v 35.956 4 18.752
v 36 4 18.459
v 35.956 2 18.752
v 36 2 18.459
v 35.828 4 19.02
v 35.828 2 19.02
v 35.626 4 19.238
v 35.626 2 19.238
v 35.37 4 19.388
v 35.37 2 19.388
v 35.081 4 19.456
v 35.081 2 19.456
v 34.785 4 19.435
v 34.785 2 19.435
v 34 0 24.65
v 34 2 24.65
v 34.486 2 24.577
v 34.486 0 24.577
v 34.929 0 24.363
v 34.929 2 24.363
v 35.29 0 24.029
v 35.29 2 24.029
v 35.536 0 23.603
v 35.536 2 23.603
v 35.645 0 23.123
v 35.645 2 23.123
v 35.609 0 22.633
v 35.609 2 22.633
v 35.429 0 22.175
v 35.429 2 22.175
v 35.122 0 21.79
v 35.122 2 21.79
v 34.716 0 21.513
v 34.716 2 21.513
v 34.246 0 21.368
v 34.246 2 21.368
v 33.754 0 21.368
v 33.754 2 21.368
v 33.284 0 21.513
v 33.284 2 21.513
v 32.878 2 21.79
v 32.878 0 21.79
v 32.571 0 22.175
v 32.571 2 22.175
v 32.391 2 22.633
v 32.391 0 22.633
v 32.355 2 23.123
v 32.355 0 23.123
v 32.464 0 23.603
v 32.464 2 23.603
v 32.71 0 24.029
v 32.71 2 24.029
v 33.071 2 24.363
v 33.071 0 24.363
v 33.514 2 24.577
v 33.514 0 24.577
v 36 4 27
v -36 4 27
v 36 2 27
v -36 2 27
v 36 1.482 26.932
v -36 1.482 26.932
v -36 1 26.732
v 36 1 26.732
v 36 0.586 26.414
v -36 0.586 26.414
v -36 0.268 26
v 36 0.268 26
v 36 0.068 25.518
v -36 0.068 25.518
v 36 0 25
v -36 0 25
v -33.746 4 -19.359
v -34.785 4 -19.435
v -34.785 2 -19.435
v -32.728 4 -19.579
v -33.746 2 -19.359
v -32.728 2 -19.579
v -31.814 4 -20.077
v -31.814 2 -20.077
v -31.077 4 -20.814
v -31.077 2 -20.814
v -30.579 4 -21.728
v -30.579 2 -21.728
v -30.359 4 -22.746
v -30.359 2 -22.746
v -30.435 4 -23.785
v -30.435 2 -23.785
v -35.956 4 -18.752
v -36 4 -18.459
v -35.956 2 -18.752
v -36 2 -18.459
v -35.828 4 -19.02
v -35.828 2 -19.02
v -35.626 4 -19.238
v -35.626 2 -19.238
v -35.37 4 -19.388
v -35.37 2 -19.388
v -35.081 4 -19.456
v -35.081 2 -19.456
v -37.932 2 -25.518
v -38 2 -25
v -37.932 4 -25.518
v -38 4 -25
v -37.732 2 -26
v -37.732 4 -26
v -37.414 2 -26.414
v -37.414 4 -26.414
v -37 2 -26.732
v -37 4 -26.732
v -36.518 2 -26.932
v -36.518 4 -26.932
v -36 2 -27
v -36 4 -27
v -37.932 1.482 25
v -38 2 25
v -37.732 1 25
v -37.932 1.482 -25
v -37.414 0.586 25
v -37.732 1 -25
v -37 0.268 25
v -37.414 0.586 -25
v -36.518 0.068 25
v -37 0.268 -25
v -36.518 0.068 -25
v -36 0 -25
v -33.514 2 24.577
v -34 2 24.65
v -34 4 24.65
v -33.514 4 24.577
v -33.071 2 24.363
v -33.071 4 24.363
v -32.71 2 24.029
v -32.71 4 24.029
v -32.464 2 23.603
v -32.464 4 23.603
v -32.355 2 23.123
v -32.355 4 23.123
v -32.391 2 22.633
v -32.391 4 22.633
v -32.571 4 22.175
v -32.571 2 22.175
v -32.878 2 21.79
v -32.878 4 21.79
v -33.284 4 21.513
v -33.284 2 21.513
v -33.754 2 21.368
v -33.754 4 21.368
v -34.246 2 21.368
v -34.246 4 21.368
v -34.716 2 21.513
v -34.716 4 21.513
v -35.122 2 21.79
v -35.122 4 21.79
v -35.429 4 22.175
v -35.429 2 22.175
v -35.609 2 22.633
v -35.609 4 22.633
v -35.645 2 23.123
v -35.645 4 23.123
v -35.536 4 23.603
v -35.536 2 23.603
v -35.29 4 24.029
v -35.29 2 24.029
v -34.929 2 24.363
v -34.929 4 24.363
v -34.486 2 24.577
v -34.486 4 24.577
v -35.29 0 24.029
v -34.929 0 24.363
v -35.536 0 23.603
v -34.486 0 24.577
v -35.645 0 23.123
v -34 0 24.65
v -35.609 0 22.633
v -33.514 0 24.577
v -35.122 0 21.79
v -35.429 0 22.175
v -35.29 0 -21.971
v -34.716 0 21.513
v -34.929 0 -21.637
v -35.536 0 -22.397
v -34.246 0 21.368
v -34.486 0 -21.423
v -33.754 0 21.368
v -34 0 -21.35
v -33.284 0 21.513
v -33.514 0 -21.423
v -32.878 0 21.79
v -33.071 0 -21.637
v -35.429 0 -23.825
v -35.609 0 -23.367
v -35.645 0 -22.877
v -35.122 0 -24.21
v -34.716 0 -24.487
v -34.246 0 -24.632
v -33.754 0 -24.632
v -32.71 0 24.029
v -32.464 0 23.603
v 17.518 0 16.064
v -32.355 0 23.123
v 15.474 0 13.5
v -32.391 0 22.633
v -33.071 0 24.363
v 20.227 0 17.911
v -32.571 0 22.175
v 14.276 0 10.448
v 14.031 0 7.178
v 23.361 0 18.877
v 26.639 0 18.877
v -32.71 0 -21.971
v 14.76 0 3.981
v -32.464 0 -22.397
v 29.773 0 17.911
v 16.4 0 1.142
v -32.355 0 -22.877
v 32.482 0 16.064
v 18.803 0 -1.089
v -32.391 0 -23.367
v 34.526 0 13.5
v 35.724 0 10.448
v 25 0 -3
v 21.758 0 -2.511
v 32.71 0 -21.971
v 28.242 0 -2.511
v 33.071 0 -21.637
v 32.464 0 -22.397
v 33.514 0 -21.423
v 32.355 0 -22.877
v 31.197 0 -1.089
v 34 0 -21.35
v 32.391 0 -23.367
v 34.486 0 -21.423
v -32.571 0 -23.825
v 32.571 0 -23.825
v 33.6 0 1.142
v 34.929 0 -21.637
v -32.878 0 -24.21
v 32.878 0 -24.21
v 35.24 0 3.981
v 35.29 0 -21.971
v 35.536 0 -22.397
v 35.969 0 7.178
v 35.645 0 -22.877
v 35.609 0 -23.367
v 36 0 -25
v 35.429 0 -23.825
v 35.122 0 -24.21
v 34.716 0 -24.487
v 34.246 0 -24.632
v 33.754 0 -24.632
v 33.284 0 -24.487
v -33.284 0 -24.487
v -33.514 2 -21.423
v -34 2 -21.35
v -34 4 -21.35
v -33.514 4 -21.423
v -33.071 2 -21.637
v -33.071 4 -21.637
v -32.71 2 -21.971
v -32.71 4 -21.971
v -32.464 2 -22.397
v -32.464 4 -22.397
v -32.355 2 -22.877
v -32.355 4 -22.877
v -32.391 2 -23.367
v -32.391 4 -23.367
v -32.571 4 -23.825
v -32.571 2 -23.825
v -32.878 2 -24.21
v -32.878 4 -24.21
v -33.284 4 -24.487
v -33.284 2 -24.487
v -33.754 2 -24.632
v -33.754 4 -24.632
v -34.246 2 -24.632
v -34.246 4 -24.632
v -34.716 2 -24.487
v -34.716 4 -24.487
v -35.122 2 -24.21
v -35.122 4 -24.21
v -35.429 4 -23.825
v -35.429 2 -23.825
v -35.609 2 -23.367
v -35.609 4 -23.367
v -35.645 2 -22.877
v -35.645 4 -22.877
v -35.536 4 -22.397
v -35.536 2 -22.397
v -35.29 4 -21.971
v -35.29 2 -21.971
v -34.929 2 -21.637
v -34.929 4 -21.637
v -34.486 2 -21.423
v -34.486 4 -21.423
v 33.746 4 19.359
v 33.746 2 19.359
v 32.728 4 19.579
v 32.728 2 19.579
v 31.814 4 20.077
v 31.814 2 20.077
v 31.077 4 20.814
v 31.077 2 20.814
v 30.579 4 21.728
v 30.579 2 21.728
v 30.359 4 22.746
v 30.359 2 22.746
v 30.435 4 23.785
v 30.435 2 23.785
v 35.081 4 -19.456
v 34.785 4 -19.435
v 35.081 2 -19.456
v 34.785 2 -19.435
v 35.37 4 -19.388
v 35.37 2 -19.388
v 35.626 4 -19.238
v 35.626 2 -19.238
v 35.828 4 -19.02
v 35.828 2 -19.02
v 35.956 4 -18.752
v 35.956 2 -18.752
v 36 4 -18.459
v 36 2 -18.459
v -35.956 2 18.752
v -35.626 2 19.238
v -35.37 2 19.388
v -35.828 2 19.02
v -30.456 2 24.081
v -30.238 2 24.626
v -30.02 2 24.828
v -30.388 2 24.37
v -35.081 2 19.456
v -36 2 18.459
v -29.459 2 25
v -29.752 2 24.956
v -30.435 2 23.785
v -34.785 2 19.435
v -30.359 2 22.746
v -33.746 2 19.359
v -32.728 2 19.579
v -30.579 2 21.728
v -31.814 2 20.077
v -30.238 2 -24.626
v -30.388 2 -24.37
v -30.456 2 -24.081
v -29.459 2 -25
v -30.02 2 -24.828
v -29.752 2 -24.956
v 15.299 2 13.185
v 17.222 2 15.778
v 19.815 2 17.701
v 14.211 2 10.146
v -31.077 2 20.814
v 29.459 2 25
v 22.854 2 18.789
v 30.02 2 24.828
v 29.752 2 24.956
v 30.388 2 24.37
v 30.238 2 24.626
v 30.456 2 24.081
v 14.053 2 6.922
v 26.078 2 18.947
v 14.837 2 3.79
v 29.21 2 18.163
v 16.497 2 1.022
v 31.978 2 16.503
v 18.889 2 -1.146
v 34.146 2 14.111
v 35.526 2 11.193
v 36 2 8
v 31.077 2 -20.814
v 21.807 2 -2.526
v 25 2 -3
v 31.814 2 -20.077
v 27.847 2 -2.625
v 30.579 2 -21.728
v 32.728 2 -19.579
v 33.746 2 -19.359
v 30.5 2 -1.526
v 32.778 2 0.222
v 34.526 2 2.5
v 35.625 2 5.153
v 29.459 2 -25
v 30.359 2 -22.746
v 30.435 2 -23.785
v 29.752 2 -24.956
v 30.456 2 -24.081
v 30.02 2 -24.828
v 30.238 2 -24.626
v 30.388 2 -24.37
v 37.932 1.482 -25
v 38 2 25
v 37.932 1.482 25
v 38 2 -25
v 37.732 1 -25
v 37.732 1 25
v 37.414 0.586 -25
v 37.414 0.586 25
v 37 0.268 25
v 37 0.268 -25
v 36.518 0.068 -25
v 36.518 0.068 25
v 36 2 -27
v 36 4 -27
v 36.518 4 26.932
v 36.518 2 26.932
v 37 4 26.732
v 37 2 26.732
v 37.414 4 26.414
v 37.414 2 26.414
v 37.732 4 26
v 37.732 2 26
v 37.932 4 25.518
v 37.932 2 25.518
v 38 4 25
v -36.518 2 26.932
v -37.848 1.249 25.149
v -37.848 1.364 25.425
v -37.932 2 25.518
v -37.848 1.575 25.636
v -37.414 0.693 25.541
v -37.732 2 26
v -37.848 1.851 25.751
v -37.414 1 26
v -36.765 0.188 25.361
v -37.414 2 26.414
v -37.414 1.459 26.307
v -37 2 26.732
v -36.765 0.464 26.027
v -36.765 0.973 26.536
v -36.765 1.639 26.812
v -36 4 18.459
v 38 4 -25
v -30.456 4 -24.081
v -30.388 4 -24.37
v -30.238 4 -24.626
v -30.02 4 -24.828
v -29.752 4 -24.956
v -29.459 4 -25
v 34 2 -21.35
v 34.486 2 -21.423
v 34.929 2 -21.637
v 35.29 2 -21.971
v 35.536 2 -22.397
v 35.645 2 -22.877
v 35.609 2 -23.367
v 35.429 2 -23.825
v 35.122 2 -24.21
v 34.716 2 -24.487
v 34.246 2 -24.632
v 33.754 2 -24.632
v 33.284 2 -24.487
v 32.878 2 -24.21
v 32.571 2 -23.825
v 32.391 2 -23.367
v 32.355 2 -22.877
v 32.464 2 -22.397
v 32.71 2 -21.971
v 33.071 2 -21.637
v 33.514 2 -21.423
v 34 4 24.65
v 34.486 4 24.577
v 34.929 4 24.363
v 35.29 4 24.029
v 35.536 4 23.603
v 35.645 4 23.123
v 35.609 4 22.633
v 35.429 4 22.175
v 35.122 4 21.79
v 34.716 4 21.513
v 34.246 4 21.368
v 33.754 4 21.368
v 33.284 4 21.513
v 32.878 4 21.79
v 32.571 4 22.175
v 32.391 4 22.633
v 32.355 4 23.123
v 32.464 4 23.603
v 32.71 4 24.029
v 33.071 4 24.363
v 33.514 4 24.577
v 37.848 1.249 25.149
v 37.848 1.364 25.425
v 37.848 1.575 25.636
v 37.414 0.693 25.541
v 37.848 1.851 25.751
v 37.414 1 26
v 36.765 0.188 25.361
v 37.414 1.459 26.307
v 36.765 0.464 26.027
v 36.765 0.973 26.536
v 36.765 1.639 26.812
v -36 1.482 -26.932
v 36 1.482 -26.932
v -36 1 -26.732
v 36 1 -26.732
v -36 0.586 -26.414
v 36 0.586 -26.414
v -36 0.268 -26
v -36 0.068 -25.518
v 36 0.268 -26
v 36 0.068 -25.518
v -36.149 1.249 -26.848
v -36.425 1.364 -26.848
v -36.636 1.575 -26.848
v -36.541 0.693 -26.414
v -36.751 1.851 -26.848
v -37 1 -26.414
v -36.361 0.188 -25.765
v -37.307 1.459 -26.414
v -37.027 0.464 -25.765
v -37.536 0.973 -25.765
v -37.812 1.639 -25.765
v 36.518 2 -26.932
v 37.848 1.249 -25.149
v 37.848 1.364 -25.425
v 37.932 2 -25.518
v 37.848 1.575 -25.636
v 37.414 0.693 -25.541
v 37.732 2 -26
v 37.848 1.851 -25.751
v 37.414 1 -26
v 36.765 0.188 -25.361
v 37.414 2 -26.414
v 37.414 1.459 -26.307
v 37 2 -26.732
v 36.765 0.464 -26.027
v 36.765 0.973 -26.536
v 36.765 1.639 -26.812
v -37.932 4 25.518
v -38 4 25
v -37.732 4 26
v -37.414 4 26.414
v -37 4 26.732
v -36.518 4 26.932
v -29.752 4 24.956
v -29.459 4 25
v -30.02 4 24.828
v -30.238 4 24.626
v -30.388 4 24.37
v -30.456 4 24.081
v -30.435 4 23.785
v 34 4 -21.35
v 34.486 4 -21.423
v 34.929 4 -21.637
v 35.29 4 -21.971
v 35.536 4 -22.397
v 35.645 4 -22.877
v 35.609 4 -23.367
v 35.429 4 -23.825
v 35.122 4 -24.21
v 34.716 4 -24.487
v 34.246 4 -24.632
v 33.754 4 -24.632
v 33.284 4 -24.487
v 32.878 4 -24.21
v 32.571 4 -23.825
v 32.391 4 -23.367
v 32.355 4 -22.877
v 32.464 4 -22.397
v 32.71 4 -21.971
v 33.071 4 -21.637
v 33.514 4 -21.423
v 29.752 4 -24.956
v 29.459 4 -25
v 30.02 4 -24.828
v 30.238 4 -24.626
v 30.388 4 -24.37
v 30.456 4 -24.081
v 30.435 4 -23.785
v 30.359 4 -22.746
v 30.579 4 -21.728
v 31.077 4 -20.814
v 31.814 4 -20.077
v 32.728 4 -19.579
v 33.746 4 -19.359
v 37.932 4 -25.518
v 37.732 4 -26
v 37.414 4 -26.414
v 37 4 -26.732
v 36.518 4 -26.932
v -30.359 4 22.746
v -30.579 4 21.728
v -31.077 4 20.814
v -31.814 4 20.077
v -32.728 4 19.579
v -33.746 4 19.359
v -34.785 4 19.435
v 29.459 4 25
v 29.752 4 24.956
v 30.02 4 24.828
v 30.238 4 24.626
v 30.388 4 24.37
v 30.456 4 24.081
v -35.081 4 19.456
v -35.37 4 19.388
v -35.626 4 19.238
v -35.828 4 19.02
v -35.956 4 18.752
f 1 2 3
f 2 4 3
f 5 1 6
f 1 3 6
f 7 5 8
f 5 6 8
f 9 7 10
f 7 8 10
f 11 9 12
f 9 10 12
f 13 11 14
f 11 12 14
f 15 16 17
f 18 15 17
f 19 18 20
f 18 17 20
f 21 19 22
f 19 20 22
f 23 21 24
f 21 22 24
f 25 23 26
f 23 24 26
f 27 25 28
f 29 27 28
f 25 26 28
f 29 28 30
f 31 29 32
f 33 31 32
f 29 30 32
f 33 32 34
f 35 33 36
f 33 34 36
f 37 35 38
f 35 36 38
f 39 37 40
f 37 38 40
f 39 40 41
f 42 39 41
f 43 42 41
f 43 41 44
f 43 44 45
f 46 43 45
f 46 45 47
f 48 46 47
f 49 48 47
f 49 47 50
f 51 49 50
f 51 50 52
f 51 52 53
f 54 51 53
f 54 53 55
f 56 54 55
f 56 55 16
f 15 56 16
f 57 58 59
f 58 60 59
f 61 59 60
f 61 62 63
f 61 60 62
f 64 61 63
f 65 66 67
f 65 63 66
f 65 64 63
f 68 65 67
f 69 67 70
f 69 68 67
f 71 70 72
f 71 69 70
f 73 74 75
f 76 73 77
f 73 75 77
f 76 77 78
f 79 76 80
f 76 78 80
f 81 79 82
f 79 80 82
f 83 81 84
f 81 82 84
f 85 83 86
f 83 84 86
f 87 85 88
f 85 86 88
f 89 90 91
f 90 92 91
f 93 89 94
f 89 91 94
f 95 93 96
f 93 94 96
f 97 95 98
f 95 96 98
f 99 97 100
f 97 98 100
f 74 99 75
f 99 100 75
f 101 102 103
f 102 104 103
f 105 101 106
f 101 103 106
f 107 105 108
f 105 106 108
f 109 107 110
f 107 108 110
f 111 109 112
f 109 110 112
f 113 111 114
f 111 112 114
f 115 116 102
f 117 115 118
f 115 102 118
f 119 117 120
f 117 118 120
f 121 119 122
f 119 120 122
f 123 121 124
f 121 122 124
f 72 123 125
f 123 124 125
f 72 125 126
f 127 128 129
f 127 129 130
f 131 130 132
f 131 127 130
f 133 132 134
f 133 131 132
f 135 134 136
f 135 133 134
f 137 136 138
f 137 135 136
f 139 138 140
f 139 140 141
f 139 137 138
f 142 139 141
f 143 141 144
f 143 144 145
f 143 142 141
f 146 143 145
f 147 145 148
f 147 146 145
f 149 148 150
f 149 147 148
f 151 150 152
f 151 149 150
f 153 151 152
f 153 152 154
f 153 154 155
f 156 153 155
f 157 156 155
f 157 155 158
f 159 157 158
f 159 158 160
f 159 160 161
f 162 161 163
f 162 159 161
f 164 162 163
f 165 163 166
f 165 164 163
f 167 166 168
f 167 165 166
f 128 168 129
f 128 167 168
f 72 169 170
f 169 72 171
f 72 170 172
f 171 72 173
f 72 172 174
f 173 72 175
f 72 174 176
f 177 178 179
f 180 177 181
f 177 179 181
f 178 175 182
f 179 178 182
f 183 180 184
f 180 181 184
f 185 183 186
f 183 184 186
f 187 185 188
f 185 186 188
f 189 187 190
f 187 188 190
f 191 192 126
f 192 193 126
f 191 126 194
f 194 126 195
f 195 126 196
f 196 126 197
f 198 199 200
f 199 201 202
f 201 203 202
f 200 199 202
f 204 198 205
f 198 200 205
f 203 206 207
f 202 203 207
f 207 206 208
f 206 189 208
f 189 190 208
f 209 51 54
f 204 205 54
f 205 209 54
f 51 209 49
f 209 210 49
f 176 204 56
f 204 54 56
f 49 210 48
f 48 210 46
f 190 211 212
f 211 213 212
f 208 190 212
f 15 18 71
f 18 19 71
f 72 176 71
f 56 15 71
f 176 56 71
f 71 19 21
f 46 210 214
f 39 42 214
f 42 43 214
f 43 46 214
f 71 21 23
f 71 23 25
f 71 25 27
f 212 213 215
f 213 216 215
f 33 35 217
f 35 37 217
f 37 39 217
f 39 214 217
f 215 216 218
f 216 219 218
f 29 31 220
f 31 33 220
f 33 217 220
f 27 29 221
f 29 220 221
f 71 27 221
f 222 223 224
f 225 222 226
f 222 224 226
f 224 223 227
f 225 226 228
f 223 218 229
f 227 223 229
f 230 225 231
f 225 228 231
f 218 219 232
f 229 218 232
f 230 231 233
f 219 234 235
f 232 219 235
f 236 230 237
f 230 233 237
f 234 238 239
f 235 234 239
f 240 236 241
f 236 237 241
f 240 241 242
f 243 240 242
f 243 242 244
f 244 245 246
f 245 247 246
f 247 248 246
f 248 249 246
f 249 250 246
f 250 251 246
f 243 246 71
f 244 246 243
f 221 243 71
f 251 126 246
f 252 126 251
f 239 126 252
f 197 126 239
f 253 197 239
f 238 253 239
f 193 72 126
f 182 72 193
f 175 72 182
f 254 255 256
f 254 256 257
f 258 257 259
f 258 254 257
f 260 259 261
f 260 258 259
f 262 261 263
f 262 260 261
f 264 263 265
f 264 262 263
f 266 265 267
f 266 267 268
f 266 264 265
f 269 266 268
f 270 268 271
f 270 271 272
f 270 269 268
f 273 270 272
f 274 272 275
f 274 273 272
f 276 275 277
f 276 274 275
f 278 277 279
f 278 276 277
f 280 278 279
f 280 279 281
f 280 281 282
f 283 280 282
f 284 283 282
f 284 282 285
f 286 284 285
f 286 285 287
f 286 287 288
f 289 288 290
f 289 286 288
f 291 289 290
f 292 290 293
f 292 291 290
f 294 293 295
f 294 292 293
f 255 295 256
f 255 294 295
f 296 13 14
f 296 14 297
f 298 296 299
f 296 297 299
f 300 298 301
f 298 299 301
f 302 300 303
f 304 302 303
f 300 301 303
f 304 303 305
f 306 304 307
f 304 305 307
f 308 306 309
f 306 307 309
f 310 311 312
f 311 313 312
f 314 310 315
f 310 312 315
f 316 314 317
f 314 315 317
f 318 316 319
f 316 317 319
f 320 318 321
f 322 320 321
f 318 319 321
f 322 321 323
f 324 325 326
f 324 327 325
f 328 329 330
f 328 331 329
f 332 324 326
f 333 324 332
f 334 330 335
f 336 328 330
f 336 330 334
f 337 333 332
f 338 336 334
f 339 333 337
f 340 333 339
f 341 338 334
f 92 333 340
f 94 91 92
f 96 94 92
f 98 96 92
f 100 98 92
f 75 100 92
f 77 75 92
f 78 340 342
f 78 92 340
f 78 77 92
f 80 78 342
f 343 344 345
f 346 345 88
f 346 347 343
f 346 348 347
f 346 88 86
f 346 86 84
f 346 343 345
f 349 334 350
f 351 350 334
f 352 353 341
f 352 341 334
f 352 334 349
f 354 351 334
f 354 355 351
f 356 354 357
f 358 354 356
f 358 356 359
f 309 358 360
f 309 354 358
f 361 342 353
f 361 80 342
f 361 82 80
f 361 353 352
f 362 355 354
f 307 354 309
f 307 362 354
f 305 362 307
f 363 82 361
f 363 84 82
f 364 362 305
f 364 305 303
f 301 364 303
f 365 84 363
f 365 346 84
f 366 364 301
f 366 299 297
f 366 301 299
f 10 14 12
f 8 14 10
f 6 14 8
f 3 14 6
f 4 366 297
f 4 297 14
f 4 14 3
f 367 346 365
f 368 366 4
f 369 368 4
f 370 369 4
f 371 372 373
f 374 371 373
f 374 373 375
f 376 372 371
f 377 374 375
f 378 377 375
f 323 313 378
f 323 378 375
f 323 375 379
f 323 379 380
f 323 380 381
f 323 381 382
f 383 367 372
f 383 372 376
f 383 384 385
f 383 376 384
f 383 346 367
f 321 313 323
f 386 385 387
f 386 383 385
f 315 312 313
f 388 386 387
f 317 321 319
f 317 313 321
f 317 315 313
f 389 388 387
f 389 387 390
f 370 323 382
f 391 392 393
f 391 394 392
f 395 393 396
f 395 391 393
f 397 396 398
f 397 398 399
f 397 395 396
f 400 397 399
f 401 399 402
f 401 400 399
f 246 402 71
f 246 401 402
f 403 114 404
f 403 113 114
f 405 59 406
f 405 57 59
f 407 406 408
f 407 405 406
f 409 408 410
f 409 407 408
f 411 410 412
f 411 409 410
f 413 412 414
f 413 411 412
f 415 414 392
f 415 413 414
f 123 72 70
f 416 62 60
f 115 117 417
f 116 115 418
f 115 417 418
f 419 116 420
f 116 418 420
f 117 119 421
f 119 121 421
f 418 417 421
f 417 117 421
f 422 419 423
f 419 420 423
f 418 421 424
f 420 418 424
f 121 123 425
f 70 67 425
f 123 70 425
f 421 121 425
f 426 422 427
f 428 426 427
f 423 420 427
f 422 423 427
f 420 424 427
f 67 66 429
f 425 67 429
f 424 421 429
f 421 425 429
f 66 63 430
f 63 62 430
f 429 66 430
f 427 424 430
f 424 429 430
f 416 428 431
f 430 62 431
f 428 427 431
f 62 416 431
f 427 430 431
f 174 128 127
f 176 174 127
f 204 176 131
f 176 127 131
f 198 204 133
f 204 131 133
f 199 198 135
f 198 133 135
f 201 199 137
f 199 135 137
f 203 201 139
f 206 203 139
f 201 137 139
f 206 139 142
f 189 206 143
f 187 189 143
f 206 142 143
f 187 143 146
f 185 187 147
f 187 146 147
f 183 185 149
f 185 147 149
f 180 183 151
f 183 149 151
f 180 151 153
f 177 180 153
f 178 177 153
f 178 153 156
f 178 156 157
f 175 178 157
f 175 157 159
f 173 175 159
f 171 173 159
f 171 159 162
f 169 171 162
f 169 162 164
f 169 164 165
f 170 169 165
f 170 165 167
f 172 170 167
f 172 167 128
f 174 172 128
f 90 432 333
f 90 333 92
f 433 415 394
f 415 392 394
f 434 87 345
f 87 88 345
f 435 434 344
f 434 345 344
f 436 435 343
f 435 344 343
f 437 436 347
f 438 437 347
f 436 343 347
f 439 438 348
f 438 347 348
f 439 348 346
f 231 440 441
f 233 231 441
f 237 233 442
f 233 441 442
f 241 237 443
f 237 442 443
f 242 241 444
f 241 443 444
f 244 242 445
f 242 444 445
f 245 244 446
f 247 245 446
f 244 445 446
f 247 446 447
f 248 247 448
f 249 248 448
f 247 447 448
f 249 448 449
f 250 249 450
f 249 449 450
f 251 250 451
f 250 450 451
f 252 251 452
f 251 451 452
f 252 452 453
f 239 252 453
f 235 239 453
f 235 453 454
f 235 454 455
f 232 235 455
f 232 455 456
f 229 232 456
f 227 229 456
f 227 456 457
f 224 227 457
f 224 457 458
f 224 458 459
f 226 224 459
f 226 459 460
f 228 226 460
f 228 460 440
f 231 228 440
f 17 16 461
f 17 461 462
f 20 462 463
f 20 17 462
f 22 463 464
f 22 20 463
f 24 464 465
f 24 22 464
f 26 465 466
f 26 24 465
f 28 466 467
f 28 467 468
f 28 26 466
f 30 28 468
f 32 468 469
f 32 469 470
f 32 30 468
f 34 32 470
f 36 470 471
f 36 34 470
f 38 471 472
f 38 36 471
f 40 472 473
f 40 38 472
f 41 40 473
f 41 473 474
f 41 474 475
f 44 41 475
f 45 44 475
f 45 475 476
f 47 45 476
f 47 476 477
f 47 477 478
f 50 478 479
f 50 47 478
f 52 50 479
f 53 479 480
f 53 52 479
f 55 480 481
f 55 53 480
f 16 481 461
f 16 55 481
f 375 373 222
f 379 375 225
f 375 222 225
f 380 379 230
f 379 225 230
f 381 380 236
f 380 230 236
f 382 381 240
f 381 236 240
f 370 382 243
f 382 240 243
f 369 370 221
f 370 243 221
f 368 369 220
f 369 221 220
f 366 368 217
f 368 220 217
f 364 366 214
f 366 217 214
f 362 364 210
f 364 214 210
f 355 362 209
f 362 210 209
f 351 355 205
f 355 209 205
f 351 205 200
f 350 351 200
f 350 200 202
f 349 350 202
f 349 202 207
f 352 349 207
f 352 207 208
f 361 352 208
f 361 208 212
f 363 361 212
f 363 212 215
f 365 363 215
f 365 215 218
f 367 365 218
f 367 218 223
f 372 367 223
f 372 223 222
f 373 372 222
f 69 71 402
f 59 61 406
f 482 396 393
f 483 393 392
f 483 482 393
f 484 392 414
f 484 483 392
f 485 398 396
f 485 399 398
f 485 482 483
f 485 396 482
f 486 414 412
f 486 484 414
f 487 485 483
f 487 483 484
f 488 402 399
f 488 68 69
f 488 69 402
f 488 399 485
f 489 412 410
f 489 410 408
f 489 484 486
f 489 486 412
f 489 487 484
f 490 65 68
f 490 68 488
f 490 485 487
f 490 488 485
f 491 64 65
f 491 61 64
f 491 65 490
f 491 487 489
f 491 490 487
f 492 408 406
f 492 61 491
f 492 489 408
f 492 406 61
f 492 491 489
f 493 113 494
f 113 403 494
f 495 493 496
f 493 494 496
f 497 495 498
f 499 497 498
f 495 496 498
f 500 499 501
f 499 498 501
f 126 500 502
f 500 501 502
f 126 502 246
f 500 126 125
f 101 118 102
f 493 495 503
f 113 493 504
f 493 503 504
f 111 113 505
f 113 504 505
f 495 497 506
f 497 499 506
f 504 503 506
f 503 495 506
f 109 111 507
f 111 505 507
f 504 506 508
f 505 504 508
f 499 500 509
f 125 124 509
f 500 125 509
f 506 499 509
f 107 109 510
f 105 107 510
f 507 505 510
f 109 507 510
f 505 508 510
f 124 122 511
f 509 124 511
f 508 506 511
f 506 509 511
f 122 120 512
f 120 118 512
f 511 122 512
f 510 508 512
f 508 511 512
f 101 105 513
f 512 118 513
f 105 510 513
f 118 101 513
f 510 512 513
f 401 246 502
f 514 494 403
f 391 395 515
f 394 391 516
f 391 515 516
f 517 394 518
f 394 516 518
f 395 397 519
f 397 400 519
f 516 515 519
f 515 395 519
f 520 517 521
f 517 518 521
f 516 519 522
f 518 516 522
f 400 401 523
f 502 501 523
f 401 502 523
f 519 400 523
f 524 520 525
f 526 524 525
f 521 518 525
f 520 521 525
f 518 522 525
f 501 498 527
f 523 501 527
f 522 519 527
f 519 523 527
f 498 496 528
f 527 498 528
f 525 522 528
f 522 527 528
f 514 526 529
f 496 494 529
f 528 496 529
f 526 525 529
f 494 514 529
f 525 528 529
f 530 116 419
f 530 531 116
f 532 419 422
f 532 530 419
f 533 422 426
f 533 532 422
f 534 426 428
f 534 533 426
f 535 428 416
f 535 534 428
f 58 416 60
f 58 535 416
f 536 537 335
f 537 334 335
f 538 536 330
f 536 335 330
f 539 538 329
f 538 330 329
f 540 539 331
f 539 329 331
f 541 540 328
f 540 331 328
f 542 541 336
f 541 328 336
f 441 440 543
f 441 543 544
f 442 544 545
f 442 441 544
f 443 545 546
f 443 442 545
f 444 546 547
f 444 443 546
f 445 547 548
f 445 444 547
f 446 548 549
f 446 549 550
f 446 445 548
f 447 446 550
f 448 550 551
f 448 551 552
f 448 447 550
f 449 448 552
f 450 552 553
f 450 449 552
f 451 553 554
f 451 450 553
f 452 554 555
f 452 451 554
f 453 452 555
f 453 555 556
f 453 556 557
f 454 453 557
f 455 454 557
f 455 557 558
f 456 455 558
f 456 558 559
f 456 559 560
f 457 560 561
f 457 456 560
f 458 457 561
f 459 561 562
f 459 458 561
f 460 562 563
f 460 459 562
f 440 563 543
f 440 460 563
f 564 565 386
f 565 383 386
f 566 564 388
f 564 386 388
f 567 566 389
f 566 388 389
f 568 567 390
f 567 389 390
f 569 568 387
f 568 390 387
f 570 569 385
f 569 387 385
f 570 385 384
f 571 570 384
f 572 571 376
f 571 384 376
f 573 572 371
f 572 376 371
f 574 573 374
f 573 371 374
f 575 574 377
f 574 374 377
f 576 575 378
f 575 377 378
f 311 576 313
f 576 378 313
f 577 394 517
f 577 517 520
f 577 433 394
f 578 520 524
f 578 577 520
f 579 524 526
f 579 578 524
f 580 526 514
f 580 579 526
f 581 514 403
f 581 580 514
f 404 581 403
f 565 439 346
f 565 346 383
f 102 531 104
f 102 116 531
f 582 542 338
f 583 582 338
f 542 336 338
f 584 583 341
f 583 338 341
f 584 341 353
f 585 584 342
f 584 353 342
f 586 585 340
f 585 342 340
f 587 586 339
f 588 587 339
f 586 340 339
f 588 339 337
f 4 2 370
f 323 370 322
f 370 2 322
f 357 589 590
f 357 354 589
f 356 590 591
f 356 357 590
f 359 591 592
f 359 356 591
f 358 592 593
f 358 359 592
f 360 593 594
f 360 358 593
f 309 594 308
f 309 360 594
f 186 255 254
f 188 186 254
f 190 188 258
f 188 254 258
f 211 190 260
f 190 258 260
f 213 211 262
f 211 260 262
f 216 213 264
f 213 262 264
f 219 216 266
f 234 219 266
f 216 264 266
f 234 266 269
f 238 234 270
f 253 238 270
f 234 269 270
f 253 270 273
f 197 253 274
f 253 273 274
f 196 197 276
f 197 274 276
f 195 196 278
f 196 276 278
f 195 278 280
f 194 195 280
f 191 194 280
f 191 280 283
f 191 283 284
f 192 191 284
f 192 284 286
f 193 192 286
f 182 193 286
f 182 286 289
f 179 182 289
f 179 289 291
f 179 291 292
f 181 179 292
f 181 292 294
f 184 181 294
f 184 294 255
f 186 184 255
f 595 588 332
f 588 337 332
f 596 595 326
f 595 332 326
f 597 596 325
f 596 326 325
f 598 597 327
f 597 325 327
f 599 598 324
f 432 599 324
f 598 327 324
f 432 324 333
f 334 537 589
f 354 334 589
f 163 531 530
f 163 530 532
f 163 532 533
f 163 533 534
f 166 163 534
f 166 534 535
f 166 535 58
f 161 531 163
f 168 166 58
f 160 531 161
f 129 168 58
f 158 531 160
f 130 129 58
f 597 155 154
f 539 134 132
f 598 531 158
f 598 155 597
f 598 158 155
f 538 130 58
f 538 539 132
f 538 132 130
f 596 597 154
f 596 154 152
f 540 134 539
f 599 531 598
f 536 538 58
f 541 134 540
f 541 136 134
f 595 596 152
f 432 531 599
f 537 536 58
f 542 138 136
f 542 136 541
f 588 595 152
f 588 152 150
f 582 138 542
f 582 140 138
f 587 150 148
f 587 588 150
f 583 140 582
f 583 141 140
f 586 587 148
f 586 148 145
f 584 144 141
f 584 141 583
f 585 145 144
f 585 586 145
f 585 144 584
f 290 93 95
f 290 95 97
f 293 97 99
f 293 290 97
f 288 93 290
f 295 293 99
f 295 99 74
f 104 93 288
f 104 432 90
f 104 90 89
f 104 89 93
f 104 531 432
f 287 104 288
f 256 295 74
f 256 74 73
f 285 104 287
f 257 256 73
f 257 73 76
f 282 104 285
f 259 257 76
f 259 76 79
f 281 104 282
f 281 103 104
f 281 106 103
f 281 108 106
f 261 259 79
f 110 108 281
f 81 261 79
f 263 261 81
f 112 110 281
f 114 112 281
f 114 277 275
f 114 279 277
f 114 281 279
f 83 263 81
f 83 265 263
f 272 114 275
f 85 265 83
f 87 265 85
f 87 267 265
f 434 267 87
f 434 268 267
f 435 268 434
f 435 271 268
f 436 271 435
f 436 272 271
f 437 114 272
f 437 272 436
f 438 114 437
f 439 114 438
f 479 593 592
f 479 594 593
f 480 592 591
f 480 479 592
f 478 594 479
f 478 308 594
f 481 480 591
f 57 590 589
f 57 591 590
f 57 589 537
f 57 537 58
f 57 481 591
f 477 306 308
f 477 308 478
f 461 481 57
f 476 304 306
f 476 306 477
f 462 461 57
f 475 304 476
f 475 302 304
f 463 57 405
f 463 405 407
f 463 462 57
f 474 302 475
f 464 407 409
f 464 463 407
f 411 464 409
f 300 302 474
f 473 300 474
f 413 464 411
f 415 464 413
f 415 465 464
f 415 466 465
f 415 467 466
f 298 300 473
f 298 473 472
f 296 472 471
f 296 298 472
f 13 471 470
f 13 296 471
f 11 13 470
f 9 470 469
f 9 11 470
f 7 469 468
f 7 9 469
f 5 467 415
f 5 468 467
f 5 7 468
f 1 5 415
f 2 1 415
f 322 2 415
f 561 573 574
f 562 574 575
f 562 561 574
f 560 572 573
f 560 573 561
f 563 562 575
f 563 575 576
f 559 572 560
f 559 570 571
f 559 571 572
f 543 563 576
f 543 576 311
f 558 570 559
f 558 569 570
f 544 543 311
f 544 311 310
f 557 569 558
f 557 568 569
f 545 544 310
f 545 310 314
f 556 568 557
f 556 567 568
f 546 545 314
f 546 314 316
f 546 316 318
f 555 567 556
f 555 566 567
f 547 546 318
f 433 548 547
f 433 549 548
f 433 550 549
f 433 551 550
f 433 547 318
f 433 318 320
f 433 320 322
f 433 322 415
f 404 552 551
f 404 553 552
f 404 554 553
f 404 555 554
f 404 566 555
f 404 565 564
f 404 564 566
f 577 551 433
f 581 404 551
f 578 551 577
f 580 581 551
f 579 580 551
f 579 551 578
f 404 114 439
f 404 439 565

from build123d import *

# Parameters (mm, degrees)
SCHIZZO1_W                   = 76
SCHIZZO1_H                   = 54
ESTRUSIONE_ESTRUSIONE1_DEPTH = 4
SCHIZZO2_W                   = 72
SCHIZZO2_H                   = 50
TAGLIO_ESTRUSIONE1_DEPTH     = 2
SCHIZZO3_R                   = 3.65
SCHIZZO3_R_2                 = 1.65
ESTRUSIONE_ESTRUSIONE2_DEPTH = 2
SCHIZZO3_11_R                = 1.65
TAGLIO_ESTRUSIONE4_DEPTH     = 47.658332589
SCHIZZO5_R                   = 11
TAGLIO_ESTRUSIONE5_DEPTH     = 2
RACCORDO1_R                  = 2
RACCORDO2_R                  = 1


with BuildPart() as part:
    # Schizzo1 → Estrusione-Estrusione1 (new body)
    with BuildSketch(Plane(origin=(0, 0, 0), x_dir=(1, 0, 0), z_dir=(0, 1, 0))):
        Rectangle(SCHIZZO1_W, SCHIZZO1_H)
    extrude(amount=ESTRUSIONE_ESTRUSIONE1_DEPTH)

    # Schizzo2 → Taglio-Estrusione1 (cut)
    with BuildSketch(Plane(origin=(0, 4, 0), x_dir=(1, 0, 0), z_dir=(0, 1, 0))):
        Rectangle(SCHIZZO2_W, SCHIZZO2_H)
    extrude(amount=-TAGLIO_ESTRUSIONE1_DEPTH, mode=Mode.SUBTRACT)

    # Schizzo3 → Estrusione-Estrusione2 (add)
    # profile 1 of 4: a face of its own
    with BuildSketch(Plane(origin=(0, 2, 0), x_dir=(1, 0, 0), z_dir=(0, 1, 0))):
        with Locations((34, 23)):
            Circle(SCHIZZO3_R)
        with Locations(Location((34, 23, 0), (0, 0, 270))):
            Circle(SCHIZZO3_R_2, mode=Mode.SUBTRACT)
    # profile 2 of 4: a face of its own
    with BuildSketch(Plane(origin=(0, 2, 0), x_dir=(1, 0, 0), z_dir=(0, 1, 0))):
        with Locations((-34, 23)):
            Circle(SCHIZZO3_R)
        with Locations(Location((-34, 23, 0), (0, 0, 270))):
            Circle(SCHIZZO3_R_2, mode=Mode.SUBTRACT)
    # profile 3 of 4: a face of its own
    with BuildSketch(Plane(origin=(0, 2, 0), x_dir=(1, 0, 0), z_dir=(0, 1, 0))):
        with Locations((34, -23)):
            Circle(SCHIZZO3_R)
        with Locations(Location((34, -23, 0), (0, 0, 270))):
            Circle(SCHIZZO3_R_2, mode=Mode.SUBTRACT)
    # profile 4 of 4: a face of its own
    with BuildSketch(Plane(origin=(0, 2, 0), x_dir=(1, 0, 0), z_dir=(0, 1, 0))):
        with Locations((-34, -23)):
            Circle(SCHIZZO3_R)
        with Locations(Location((-34, -23, 0), (0, 0, 270))):
            Circle(SCHIZZO3_R_2, mode=Mode.SUBTRACT)
    extrude(amount=ESTRUSIONE_ESTRUSIONE2_DEPTH)

    # Schizzo3<11> → Taglio-Estrusione4 (cut, through all)
    with BuildSketch(Plane(origin=(0, 2, 0), x_dir=(1, 0, 0), z_dir=(0, 1, 0))):
        with Locations(Location((-34, 23, 0), (0, 0, 270))):
            Circle(SCHIZZO3_11_R)
        with Locations(Location((-34, -23, 0), (0, 0, 270))):
            Circle(SCHIZZO3_11_R)
        with Locations(Location((34, -23, 0), (0, 0, 270))):
            Circle(SCHIZZO3_11_R)
        with Locations(Location((34, 23, 0), (0, 0, 270))):
            Circle(SCHIZZO3_11_R)
    extrude(amount=-TAGLIO_ESTRUSIONE4_DEPTH, mode=Mode.SUBTRACT)

    # Schizzo5 → Taglio-Estrusione5 (cut)
    with BuildSketch(Plane.XZ):
        with Locations(Location((25, 8, 0), (0, 0, 270))):
            Circle(SCHIZZO5_R)
    extrude(amount=-TAGLIO_ESTRUSIONE5_DEPTH, mode=Mode.SUBTRACT)

    # Raccordo1
    raccordo1_edges = [part.edges().sort_by_distance(p)[0] for p in [
        (0, 0, 27),
        (-38, 0, 0),
        (0, 0, -27),
        (38, 0, 0),
        (38, 2, 27),
        (-38, 2, 27),
        (-38, 2, -27),
        (38, 2, -27),
    ]]
    fillet(raccordo1_edges, radius=RACCORDO1_R - 0.0001)  # a hair under: the kernel refuses the full size

    # Raccordo2
    raccordo2_edges = [part.edges().sort_by_distance(p)[0] for p in [
        (30.946723072, 3, -25),
        (36, 3, -19.946723072),
        (-36, 3, -19.946723072),
        (-30.946723072, 3, -25),
        (-30.946723072, 3, 25),
        (-36, 3, 19.946723072),
        (36, 3, 19.946723072),
        (30.946723072, 3, 25),
    ]]
    fillet(raccordo2_edges, radius=RACCORDO2_R)


solid = part.part
